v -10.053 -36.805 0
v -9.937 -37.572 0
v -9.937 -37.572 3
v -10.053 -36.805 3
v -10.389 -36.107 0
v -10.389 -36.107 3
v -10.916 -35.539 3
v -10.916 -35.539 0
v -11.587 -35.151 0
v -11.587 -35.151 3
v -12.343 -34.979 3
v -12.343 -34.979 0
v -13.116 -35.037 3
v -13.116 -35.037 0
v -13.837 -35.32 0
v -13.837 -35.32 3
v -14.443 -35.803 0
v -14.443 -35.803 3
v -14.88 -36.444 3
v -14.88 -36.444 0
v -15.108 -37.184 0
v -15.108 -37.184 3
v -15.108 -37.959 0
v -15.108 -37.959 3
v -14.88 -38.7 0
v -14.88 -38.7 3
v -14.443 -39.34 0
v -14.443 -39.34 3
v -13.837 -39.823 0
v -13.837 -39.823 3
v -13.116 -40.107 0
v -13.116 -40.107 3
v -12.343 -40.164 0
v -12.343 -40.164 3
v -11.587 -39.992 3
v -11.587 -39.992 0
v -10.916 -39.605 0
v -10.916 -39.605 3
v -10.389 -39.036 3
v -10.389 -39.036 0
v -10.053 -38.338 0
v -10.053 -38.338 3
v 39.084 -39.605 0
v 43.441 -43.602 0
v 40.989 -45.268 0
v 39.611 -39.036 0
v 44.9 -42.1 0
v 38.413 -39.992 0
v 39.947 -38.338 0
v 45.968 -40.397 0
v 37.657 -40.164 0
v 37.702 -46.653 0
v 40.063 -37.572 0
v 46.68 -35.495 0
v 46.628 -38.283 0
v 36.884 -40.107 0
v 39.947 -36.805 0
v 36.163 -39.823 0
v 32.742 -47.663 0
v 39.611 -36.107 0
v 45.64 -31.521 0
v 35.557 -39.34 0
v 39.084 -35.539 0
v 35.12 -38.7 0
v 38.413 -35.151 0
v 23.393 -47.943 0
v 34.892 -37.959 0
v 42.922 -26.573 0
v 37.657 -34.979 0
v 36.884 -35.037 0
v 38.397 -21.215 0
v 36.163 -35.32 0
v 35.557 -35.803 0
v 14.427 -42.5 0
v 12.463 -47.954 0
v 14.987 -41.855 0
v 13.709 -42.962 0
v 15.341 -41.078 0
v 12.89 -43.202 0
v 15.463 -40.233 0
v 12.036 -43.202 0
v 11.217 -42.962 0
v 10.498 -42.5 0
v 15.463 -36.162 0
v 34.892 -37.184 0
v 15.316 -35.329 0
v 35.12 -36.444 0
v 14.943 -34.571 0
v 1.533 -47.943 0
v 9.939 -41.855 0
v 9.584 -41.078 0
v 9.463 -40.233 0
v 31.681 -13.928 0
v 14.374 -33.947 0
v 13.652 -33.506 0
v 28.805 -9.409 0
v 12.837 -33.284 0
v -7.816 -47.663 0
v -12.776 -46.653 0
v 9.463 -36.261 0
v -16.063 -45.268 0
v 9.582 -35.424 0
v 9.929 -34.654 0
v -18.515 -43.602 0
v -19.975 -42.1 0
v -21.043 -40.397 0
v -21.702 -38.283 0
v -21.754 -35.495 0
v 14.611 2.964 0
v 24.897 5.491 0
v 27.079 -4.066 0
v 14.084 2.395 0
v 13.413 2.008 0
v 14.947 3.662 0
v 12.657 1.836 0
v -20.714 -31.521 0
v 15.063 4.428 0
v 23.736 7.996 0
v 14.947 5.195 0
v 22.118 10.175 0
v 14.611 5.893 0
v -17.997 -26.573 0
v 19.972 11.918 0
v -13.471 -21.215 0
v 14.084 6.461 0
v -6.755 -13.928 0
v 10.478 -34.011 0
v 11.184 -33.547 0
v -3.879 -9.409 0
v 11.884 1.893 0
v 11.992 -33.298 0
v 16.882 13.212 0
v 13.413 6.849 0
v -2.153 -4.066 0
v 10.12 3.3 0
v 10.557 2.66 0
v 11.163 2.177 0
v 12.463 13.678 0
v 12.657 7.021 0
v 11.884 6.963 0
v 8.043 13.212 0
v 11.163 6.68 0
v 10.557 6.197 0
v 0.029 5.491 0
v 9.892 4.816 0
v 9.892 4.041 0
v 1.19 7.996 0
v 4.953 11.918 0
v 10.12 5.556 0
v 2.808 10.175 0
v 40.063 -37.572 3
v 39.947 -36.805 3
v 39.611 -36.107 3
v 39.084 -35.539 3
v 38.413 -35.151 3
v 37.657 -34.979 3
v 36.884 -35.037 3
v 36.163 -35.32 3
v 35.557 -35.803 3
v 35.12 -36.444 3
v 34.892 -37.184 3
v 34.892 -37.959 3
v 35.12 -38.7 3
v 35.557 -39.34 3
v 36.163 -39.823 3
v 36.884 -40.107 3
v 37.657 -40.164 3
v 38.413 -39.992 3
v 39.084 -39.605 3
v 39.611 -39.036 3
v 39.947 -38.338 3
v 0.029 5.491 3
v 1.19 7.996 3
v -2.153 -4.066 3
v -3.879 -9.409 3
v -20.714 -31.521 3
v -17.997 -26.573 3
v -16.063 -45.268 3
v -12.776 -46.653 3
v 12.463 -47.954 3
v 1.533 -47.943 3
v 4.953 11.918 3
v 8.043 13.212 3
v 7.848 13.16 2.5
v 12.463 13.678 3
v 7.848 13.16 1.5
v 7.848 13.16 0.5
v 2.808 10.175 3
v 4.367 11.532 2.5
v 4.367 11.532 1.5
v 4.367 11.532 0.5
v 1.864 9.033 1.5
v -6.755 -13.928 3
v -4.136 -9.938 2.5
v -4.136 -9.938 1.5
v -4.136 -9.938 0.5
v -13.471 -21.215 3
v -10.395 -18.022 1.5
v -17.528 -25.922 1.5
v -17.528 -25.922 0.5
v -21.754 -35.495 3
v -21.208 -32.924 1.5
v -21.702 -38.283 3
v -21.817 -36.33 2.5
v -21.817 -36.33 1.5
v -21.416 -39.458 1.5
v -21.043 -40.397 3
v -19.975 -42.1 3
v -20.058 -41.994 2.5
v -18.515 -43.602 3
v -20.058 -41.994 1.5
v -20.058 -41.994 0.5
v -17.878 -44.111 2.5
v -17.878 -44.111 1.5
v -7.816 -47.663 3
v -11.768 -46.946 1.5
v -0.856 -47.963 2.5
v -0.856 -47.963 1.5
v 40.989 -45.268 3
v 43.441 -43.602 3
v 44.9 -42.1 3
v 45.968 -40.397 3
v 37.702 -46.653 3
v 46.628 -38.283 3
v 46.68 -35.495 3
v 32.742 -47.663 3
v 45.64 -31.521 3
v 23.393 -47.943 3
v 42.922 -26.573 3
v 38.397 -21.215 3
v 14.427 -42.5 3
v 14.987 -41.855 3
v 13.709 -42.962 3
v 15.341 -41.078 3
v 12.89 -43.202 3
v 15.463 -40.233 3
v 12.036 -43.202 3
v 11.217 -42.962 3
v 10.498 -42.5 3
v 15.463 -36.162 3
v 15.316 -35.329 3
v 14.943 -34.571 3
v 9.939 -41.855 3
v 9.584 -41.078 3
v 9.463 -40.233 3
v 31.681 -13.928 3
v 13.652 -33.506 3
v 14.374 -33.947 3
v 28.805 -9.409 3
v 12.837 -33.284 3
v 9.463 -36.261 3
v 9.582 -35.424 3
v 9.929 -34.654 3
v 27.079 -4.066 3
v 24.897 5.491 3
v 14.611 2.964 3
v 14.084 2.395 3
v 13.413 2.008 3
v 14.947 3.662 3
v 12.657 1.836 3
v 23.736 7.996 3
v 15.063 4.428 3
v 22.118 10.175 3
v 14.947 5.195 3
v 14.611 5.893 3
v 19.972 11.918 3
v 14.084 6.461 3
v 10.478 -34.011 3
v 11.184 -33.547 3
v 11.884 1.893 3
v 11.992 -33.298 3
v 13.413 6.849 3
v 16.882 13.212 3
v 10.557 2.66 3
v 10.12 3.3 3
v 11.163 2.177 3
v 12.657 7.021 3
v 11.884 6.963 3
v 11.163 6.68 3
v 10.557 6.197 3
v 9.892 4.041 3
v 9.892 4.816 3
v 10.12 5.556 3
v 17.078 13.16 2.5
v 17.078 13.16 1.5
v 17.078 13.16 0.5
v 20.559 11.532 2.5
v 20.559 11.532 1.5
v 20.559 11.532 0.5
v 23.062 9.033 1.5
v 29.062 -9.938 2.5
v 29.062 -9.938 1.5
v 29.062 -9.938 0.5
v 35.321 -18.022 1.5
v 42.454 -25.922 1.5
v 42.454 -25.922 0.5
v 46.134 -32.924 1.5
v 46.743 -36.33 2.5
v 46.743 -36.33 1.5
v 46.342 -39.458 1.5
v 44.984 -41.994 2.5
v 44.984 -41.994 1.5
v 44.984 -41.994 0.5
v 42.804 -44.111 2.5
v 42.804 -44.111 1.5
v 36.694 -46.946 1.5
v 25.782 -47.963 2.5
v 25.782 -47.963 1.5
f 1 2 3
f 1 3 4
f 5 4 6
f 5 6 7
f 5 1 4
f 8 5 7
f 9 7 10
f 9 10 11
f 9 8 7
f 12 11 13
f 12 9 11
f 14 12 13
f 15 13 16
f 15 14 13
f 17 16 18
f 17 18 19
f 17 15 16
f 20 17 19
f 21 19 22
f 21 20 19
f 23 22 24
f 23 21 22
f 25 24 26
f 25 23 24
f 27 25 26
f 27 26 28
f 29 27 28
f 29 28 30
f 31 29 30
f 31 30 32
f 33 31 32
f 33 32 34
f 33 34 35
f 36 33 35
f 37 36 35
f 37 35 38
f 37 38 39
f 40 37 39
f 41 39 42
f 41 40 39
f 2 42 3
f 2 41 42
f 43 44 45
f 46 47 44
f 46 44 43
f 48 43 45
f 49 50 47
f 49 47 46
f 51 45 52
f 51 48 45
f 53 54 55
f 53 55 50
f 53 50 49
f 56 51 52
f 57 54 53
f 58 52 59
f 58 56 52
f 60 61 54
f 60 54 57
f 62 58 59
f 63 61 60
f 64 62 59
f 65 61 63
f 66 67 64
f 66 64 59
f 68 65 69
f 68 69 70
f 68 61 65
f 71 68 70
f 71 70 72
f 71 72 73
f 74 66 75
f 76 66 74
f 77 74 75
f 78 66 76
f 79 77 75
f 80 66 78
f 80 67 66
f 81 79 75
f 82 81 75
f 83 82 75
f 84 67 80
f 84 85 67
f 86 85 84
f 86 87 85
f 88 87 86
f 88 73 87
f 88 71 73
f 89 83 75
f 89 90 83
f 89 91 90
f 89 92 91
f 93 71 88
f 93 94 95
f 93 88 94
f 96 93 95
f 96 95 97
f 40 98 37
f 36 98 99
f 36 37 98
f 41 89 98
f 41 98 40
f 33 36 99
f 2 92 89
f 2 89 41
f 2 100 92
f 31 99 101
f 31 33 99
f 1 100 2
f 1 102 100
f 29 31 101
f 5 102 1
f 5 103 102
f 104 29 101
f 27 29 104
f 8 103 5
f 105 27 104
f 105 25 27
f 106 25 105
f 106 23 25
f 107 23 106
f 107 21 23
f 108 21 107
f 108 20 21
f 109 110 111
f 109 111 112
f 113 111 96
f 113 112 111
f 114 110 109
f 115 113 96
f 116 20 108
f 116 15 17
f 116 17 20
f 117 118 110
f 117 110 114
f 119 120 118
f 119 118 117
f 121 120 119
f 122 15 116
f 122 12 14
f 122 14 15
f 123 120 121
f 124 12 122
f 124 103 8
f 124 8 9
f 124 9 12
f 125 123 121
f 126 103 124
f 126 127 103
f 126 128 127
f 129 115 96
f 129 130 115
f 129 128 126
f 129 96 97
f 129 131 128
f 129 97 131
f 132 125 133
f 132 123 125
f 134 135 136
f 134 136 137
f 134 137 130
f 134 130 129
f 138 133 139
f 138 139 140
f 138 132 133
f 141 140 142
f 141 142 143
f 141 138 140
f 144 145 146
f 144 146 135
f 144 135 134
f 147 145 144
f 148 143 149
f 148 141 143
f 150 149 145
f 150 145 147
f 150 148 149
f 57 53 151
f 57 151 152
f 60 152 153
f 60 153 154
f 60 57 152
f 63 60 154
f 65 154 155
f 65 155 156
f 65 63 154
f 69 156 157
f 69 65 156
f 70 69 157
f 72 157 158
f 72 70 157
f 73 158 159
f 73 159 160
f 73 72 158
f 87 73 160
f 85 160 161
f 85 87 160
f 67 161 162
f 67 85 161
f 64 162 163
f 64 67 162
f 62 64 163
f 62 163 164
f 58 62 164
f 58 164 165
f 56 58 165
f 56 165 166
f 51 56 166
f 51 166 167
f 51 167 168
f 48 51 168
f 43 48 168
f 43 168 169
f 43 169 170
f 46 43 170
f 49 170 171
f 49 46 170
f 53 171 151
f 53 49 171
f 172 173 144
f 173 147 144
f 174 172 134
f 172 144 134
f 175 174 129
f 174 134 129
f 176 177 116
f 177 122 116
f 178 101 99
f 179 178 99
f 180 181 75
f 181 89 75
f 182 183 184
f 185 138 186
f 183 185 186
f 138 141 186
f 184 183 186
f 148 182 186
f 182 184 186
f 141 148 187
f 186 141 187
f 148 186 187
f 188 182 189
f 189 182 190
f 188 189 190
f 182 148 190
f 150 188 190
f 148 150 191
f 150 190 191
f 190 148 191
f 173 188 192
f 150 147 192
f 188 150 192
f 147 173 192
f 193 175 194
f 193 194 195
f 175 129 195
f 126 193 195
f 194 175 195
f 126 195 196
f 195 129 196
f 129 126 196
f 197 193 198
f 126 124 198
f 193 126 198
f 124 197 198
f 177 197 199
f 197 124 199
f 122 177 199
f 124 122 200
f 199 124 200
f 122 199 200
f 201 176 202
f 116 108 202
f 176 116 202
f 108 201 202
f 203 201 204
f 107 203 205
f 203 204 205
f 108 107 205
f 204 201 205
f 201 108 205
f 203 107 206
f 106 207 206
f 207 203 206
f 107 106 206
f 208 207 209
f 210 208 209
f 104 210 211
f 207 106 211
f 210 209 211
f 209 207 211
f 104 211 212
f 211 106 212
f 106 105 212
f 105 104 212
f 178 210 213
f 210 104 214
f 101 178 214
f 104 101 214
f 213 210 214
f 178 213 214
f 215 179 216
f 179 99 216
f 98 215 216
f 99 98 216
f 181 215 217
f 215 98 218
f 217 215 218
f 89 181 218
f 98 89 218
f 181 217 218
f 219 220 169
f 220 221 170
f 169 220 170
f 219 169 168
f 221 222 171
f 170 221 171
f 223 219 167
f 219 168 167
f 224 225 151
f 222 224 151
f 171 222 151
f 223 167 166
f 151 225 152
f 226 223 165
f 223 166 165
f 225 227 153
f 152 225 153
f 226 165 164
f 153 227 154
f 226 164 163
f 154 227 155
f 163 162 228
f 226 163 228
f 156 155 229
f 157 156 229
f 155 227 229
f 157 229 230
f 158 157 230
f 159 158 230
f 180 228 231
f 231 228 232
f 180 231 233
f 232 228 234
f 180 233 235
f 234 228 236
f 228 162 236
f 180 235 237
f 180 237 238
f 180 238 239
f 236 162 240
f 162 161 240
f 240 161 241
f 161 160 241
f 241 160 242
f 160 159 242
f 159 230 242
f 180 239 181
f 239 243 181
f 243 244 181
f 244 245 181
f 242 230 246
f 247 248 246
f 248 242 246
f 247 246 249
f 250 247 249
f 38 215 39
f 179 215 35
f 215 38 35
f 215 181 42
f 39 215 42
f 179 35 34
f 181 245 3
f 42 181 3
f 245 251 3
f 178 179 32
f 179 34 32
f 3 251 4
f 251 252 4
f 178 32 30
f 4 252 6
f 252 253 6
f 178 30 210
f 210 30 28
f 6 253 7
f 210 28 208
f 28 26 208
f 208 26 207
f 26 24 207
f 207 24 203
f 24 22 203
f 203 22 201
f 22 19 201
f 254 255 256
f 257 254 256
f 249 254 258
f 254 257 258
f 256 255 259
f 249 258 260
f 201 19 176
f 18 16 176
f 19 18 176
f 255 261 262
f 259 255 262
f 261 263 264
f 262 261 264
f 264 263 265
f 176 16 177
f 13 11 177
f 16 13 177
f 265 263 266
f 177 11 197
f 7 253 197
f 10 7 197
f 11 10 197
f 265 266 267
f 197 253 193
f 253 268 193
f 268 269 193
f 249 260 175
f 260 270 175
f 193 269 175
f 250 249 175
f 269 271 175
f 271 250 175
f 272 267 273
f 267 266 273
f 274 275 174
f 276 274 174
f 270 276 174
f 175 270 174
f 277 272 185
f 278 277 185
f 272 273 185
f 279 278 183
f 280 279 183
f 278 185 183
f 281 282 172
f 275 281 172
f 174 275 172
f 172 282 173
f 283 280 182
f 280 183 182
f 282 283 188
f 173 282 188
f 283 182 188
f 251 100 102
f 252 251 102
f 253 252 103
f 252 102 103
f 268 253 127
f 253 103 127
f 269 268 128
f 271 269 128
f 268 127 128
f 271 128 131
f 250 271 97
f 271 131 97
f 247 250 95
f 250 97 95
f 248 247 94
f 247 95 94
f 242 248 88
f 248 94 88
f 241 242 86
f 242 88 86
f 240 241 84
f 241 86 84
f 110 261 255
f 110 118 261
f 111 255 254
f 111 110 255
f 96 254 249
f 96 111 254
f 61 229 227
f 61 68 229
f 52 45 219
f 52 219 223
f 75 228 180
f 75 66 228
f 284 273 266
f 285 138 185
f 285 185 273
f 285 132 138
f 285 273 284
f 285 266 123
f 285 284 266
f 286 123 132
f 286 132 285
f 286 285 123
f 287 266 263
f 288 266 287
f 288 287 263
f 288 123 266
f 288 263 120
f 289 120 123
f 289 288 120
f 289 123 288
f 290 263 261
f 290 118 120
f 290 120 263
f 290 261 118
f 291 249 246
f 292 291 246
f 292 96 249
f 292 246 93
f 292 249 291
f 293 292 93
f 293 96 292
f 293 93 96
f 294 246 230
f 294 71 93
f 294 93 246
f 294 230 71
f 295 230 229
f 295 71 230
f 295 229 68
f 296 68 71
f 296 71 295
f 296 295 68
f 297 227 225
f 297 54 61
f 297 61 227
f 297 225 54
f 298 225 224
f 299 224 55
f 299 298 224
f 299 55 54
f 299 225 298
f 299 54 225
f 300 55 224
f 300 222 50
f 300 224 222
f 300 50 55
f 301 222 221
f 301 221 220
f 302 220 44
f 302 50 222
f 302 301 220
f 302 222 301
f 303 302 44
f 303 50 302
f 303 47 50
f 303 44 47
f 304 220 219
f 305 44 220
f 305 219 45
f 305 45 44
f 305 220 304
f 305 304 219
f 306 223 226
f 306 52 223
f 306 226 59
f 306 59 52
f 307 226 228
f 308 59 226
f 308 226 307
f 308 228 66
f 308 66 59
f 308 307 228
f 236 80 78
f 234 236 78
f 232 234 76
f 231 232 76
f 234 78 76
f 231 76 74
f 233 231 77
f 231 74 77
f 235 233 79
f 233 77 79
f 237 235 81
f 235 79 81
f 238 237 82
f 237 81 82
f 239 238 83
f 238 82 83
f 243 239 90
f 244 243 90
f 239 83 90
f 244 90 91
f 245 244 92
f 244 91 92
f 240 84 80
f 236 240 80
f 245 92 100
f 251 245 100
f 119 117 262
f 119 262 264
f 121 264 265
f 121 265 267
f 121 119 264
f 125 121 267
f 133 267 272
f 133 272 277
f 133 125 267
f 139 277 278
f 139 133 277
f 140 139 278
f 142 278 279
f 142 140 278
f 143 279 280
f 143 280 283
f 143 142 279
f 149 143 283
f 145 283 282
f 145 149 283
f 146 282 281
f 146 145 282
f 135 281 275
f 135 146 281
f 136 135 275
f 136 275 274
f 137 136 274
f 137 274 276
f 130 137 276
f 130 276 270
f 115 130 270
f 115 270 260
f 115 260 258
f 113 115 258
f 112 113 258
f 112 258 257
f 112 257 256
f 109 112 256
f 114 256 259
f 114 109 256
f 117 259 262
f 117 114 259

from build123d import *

# Parameters (mm, degrees)
F0_R     = 2.6
F1_DEPTH = 3


with BuildPart() as f1:
    # F0 (on Top) → F1 (new body)
    with BuildSketch(Plane.XY):
        with BuildLine():
            add(Edge.make_bspline(
                [(12.4628519006, 13.6780394241), (19.4407593717, 13.8331027583), (26.7452298575, 6.7324317401), (26.3128940789, -11.5322055726), (43.6181419579, -24.266116276), (49.2919868937, -40.2839782528), (35.8826429609, -49.4228751578), (22.1731135653, -47.6006929448), (12.4628519006, -47.95422405)],
                knots=[0, 0, 0, 0, 0.1549555961, 0.3196507615, 0.5052578789, 0.6577917534, 0.7998356316, 1, 1, 1, 1], degree=3))
            add(Edge.make_bspline(
                [(12.4628519006, 13.6780394241), (5.4849444295, 13.8331027583), (-1.8195260563, 6.7324317401), (-1.3871902777, -11.5322055726), (-18.6924381567, -24.266116276), (-24.3662830925, -40.2839782528), (-10.9569391597, -49.4228751578), (2.7525902359, -47.6006929448), (12.4628519006, -47.95422405)],
                knots=[0, 0, 0, 0, 0.1549555961, 0.3196507615, 0.5052578789, 0.6577917534, 0.7998356316, 1, 1, 1, 1], degree=3))
        make_face()
        with Locations((-12.5371480994, -37.5717511536)):
            Circle(F0_R, mode=Mode.SUBTRACT)
        with BuildLine():
            ThreePointArc((15.4628519006, -40.2326815498), (12.4628519006, -43.2326815498), (9.4628519006, -40.2326815498))
            Line((9.4628519006, -40.2326815498), (9.4628519006, -36.2611748278))
            ThreePointArc((9.4628519006, -36.2611748278), (12.4139314817, -33.2607625412), (15.4628519006, -36.161698401))
            Line((15.4628519006, -36.161698401), (15.4628519006, -40.2326815498))
        make_face(mode=Mode.SUBTRACT)
        with Locations((37.4628519006, -37.5717511536)):
            Circle(F0_R, mode=Mode.SUBTRACT)
        with Locations((12.4628519006, 4.4282488464)):
            Circle(F0_R, mode=Mode.SUBTRACT)
    extrude(amount=F1_DEPTH)


solid = f1.part
